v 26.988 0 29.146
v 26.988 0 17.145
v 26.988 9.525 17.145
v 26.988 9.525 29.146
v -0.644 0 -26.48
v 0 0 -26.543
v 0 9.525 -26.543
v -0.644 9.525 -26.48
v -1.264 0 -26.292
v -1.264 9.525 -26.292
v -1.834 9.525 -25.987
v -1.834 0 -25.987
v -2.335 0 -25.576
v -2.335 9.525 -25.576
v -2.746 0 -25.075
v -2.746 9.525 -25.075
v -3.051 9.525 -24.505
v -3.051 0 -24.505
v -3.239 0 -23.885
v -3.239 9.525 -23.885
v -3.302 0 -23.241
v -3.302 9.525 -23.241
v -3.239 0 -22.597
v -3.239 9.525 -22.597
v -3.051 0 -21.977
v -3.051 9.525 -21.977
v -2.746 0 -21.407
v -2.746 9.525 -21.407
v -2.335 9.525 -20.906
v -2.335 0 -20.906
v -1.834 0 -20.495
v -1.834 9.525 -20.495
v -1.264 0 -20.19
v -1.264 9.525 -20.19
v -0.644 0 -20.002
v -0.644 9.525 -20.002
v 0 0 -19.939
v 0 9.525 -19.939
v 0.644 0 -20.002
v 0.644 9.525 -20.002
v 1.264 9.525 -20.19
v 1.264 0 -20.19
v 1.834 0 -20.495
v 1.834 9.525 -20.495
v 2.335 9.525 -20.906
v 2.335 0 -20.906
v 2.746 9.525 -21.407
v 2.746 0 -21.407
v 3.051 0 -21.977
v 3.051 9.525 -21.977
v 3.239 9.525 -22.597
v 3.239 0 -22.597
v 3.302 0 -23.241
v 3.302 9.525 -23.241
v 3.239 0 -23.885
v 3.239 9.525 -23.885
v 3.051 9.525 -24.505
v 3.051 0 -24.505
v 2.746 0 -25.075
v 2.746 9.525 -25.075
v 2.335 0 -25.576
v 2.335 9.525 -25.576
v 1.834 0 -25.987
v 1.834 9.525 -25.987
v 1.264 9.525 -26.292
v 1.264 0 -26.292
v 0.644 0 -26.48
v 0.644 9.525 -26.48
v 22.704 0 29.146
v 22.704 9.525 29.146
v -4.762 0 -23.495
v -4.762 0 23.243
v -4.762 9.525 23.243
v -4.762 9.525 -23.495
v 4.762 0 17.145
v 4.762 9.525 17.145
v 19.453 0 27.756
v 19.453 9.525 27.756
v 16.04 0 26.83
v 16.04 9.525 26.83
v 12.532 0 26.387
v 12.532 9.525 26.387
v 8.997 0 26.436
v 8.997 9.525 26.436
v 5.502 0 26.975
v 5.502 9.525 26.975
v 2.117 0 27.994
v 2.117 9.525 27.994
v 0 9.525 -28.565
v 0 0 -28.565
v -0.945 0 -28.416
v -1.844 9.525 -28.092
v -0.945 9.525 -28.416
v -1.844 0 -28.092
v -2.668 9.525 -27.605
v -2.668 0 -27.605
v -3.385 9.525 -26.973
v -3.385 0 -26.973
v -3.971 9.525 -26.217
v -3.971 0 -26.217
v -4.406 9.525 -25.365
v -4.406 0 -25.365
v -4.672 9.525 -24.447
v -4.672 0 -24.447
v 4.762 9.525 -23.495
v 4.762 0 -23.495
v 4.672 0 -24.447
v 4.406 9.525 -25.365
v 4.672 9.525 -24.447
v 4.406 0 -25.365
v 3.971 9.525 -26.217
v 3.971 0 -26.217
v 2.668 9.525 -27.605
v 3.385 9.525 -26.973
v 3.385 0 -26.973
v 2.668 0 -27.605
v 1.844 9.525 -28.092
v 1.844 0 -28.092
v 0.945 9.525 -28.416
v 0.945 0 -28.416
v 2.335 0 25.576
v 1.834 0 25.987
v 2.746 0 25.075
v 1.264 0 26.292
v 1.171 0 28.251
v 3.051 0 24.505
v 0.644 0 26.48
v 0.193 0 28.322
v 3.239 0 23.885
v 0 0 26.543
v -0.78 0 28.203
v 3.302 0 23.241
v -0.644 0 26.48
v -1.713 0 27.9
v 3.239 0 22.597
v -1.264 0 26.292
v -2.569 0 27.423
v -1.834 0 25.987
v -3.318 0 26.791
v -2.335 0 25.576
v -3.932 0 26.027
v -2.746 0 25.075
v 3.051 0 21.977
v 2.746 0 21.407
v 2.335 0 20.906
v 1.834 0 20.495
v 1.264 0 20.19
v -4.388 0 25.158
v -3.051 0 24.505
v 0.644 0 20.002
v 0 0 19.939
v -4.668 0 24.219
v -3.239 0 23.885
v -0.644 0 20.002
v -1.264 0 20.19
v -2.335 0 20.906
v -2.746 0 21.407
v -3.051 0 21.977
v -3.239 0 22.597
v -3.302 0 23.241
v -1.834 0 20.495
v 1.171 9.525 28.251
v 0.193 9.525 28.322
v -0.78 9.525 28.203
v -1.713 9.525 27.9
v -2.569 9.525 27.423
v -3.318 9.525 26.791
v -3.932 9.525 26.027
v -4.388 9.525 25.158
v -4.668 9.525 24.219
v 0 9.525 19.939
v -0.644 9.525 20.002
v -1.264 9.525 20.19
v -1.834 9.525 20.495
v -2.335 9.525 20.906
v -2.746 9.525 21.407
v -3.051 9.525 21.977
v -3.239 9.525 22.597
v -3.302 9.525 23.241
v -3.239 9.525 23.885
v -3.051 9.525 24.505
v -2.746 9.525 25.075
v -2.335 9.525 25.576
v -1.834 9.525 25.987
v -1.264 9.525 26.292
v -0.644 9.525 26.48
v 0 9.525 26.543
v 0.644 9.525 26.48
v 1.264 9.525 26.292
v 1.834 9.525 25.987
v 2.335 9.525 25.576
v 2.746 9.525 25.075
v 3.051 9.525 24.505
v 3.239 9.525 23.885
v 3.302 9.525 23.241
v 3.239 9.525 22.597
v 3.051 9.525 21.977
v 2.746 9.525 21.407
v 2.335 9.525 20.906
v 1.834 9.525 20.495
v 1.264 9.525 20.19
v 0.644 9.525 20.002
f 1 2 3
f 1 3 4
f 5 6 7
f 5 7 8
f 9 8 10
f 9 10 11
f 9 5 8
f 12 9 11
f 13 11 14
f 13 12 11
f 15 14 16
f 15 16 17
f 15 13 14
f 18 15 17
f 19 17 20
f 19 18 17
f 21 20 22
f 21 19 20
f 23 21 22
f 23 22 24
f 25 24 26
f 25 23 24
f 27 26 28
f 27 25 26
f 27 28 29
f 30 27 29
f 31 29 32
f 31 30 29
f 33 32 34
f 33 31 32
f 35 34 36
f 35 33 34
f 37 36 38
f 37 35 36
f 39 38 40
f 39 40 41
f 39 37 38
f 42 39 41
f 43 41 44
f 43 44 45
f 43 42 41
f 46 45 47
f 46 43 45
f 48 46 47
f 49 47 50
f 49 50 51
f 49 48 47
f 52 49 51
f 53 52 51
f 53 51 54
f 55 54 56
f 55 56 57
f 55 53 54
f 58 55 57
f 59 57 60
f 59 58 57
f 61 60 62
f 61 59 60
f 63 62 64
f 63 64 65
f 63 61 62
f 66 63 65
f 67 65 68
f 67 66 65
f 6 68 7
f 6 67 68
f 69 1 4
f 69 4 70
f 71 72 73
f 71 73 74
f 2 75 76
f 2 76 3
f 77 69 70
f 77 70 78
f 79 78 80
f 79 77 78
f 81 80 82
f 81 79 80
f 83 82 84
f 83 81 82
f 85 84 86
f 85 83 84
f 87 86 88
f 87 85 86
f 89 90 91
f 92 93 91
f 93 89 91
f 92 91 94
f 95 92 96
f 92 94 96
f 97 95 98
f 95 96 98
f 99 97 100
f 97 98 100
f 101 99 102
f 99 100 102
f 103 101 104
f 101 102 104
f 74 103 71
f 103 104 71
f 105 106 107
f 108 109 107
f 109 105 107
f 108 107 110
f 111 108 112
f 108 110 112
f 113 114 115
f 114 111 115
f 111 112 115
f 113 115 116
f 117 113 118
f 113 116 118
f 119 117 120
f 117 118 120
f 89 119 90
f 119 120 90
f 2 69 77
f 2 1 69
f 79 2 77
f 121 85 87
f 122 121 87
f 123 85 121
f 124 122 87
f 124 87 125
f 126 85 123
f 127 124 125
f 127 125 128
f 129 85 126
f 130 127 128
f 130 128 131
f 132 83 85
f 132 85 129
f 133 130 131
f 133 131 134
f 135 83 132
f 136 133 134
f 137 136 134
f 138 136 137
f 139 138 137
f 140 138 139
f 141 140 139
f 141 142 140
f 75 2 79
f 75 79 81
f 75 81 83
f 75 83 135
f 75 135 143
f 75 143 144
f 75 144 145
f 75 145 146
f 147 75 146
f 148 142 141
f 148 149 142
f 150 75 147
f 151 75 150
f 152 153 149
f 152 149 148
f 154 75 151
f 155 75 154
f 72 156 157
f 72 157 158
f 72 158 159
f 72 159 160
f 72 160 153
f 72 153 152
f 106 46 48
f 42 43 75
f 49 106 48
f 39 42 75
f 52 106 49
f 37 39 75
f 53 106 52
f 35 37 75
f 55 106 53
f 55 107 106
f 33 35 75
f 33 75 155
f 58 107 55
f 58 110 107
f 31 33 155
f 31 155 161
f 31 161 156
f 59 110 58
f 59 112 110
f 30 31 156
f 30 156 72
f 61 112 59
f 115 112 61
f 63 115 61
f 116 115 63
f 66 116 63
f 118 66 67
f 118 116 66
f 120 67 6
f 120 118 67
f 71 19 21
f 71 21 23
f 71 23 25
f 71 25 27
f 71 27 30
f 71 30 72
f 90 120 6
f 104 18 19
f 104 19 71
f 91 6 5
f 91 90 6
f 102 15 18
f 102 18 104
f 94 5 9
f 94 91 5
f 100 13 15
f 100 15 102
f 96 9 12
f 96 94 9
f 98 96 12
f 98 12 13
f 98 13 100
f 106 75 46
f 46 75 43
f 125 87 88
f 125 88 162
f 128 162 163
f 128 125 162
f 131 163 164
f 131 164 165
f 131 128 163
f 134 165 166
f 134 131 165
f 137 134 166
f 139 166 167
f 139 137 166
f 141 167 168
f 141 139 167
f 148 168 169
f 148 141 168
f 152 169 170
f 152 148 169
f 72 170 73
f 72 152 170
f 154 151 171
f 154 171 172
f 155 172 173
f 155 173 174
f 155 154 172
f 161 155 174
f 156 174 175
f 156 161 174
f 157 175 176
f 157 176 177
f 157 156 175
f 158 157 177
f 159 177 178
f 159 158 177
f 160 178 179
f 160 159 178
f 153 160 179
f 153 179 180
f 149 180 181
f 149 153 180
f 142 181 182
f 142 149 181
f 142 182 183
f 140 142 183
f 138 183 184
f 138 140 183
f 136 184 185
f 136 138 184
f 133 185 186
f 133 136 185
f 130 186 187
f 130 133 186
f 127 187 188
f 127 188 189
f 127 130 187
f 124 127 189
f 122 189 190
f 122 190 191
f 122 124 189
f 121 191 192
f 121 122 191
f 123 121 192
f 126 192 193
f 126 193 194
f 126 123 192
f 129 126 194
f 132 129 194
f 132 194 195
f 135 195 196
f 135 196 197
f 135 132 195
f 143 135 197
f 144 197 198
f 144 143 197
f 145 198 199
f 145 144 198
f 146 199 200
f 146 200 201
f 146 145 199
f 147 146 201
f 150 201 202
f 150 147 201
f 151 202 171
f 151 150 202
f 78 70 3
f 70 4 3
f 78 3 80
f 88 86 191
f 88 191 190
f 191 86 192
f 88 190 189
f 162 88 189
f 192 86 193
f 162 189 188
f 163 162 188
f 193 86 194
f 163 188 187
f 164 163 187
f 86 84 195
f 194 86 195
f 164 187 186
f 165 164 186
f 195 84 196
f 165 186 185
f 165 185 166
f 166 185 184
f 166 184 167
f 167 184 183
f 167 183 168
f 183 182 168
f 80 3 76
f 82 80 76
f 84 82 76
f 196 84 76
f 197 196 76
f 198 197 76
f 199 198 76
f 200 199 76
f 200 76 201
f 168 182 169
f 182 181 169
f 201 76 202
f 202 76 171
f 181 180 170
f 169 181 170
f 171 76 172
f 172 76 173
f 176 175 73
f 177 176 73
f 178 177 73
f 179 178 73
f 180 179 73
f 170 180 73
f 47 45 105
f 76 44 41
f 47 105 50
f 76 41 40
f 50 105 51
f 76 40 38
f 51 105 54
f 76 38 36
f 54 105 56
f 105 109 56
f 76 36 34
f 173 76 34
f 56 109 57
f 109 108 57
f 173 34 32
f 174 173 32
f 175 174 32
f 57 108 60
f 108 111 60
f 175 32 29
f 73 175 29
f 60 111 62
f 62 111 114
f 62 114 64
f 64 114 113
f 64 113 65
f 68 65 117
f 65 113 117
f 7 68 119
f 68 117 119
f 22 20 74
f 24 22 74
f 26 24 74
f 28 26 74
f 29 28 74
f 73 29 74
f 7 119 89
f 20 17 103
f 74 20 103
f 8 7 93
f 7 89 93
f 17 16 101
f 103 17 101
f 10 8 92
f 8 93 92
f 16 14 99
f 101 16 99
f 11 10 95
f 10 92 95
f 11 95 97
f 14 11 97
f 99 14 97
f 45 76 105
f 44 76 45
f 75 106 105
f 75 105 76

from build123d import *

# Parameters (mm, degrees)
SKETCH1_R           = 3.302
BOSS_EXTRUDE1_DEPTH = 9.525
FILLET1_R           = 5.08
FILLET2_R           = 5.08
FILLET3_DEPTH       = 9.525


with BuildPart() as part:
    # Sketch1 → Boss-Extrude1 (new body)
    with BuildSketch(Plane(origin=(0, 0, 0), x_dir=(1, 0, 0), z_dir=(0, 1, 0))):
        with BuildLine():
            Line((-4.7625, 28.575), (4.7625, 28.575))
            Line((4.7625, 28.575), (4.7625, -17.145))
            Line((4.7625, -17.145), (26.9875, -17.145))
            Line((26.9875, -17.145), (26.9875, -29.1465))
            Line((26.9875, -29.1465), (22.703516651, -29.1465))
            ThreePointArc((22.703516651, -29.1465), (11.1125, -26.347569289), (-0.478516651, -29.1465))
            Line((-0.478516651, -29.1465), (-4.7625, -29.1465))
            Line((-4.7625, -29.1465), (-4.7625, 28.575))
        make_face()
        with Locations(Location((0, -23.241, 0), (0, 0, 90))):
            Circle(SKETCH1_R, mode=Mode.SUBTRACT)
        with Locations(Location((0, 23.241, 0), (0, 0, 90))):
            Circle(SKETCH1_R, mode=Mode.SUBTRACT)
    extrude(amount=BOSS_EXTRUDE1_DEPTH)

    # Fillet1
    # the kernel refuses this fillet: 5.08 mm, written as the material it takes off along each edge
    with BuildSketch(Plane(origin=(-4.7625, -12.7, -28.575), x_dir=(0, 0, 1), z_dir=(0, 1, 0)), Plane(origin=(4.7625, -12.7, -28.575), x_dir=(-1, 0, 0), z_dir=(0, 1, 0))) as fillet1_piece_1:
        with BuildLine():
            CenterArc((FILLET1_R, FILLET1_R), FILLET1_R, 180, 90)
            Line((0, FILLET1_R), (0, 0))
            Line((0, 0), (FILLET1_R, 0))
        make_face()
    extrude(amount=34.925, mode=Mode.SUBTRACT)

    # Fillet2
    # the kernel refuses this fillet: 5.08 mm, written as the material it takes off along each edge
    with BuildSketch(Plane(origin=(-4.7625, -12.543115017, 29.1465), x_dir=(1, 0, 0), z_dir=(0, 1, 0))) as fillet2_piece_1:
        with BuildLine():
            CenterArc((5.08, 5.017246007), FILLET2_R, 180, 80.98481696)
            Line((0, 5.017246007), (-0.1016, 5.017246007))
            Line((-0.1016, 5.017246007), (-0.1016, 0))
            Line((-0.1016, 0), (0, -0.1016))
            ThreePointArc((0, -0.1016), (2.141991675, -0.1016), (4.268063016, -0.10034492))
            Line((4.268063016, -0.10034492), (4.283983349, 0))
        make_face()
    extrude(amount=34.611230034, mode=Mode.SUBTRACT)

    # Fillet3: read off the stored shape, not the designer's step
    # Fillet3 outline → Fillet3 (cut)
    with BuildSketch(Plane(origin=(0, 0, 0), x_dir=(1, 0, 0), z_dir=(0, 1, 0))):
        with BuildLine():
            ThreePointArc((-0.478516651, -29.1465), (0.802955992, -28.533924544), (2.116666667, -27.993938353))
            ThreePointArc((2.116666667, -27.993938353), (-2.569248459, -27.423293904), (-4.7625, -23.243212166))
            Line((-4.7625, -23.243212166), (-4.7625, -24.129253993))
            ThreePointArc((-4.7625, -24.129253993), (-3.545799405, -27.427938232), (-0.478516651, -29.1465))
        make_face()
    extrude(amount=FILLET3_DEPTH, mode=Mode.SUBTRACT)


solid = part.part
